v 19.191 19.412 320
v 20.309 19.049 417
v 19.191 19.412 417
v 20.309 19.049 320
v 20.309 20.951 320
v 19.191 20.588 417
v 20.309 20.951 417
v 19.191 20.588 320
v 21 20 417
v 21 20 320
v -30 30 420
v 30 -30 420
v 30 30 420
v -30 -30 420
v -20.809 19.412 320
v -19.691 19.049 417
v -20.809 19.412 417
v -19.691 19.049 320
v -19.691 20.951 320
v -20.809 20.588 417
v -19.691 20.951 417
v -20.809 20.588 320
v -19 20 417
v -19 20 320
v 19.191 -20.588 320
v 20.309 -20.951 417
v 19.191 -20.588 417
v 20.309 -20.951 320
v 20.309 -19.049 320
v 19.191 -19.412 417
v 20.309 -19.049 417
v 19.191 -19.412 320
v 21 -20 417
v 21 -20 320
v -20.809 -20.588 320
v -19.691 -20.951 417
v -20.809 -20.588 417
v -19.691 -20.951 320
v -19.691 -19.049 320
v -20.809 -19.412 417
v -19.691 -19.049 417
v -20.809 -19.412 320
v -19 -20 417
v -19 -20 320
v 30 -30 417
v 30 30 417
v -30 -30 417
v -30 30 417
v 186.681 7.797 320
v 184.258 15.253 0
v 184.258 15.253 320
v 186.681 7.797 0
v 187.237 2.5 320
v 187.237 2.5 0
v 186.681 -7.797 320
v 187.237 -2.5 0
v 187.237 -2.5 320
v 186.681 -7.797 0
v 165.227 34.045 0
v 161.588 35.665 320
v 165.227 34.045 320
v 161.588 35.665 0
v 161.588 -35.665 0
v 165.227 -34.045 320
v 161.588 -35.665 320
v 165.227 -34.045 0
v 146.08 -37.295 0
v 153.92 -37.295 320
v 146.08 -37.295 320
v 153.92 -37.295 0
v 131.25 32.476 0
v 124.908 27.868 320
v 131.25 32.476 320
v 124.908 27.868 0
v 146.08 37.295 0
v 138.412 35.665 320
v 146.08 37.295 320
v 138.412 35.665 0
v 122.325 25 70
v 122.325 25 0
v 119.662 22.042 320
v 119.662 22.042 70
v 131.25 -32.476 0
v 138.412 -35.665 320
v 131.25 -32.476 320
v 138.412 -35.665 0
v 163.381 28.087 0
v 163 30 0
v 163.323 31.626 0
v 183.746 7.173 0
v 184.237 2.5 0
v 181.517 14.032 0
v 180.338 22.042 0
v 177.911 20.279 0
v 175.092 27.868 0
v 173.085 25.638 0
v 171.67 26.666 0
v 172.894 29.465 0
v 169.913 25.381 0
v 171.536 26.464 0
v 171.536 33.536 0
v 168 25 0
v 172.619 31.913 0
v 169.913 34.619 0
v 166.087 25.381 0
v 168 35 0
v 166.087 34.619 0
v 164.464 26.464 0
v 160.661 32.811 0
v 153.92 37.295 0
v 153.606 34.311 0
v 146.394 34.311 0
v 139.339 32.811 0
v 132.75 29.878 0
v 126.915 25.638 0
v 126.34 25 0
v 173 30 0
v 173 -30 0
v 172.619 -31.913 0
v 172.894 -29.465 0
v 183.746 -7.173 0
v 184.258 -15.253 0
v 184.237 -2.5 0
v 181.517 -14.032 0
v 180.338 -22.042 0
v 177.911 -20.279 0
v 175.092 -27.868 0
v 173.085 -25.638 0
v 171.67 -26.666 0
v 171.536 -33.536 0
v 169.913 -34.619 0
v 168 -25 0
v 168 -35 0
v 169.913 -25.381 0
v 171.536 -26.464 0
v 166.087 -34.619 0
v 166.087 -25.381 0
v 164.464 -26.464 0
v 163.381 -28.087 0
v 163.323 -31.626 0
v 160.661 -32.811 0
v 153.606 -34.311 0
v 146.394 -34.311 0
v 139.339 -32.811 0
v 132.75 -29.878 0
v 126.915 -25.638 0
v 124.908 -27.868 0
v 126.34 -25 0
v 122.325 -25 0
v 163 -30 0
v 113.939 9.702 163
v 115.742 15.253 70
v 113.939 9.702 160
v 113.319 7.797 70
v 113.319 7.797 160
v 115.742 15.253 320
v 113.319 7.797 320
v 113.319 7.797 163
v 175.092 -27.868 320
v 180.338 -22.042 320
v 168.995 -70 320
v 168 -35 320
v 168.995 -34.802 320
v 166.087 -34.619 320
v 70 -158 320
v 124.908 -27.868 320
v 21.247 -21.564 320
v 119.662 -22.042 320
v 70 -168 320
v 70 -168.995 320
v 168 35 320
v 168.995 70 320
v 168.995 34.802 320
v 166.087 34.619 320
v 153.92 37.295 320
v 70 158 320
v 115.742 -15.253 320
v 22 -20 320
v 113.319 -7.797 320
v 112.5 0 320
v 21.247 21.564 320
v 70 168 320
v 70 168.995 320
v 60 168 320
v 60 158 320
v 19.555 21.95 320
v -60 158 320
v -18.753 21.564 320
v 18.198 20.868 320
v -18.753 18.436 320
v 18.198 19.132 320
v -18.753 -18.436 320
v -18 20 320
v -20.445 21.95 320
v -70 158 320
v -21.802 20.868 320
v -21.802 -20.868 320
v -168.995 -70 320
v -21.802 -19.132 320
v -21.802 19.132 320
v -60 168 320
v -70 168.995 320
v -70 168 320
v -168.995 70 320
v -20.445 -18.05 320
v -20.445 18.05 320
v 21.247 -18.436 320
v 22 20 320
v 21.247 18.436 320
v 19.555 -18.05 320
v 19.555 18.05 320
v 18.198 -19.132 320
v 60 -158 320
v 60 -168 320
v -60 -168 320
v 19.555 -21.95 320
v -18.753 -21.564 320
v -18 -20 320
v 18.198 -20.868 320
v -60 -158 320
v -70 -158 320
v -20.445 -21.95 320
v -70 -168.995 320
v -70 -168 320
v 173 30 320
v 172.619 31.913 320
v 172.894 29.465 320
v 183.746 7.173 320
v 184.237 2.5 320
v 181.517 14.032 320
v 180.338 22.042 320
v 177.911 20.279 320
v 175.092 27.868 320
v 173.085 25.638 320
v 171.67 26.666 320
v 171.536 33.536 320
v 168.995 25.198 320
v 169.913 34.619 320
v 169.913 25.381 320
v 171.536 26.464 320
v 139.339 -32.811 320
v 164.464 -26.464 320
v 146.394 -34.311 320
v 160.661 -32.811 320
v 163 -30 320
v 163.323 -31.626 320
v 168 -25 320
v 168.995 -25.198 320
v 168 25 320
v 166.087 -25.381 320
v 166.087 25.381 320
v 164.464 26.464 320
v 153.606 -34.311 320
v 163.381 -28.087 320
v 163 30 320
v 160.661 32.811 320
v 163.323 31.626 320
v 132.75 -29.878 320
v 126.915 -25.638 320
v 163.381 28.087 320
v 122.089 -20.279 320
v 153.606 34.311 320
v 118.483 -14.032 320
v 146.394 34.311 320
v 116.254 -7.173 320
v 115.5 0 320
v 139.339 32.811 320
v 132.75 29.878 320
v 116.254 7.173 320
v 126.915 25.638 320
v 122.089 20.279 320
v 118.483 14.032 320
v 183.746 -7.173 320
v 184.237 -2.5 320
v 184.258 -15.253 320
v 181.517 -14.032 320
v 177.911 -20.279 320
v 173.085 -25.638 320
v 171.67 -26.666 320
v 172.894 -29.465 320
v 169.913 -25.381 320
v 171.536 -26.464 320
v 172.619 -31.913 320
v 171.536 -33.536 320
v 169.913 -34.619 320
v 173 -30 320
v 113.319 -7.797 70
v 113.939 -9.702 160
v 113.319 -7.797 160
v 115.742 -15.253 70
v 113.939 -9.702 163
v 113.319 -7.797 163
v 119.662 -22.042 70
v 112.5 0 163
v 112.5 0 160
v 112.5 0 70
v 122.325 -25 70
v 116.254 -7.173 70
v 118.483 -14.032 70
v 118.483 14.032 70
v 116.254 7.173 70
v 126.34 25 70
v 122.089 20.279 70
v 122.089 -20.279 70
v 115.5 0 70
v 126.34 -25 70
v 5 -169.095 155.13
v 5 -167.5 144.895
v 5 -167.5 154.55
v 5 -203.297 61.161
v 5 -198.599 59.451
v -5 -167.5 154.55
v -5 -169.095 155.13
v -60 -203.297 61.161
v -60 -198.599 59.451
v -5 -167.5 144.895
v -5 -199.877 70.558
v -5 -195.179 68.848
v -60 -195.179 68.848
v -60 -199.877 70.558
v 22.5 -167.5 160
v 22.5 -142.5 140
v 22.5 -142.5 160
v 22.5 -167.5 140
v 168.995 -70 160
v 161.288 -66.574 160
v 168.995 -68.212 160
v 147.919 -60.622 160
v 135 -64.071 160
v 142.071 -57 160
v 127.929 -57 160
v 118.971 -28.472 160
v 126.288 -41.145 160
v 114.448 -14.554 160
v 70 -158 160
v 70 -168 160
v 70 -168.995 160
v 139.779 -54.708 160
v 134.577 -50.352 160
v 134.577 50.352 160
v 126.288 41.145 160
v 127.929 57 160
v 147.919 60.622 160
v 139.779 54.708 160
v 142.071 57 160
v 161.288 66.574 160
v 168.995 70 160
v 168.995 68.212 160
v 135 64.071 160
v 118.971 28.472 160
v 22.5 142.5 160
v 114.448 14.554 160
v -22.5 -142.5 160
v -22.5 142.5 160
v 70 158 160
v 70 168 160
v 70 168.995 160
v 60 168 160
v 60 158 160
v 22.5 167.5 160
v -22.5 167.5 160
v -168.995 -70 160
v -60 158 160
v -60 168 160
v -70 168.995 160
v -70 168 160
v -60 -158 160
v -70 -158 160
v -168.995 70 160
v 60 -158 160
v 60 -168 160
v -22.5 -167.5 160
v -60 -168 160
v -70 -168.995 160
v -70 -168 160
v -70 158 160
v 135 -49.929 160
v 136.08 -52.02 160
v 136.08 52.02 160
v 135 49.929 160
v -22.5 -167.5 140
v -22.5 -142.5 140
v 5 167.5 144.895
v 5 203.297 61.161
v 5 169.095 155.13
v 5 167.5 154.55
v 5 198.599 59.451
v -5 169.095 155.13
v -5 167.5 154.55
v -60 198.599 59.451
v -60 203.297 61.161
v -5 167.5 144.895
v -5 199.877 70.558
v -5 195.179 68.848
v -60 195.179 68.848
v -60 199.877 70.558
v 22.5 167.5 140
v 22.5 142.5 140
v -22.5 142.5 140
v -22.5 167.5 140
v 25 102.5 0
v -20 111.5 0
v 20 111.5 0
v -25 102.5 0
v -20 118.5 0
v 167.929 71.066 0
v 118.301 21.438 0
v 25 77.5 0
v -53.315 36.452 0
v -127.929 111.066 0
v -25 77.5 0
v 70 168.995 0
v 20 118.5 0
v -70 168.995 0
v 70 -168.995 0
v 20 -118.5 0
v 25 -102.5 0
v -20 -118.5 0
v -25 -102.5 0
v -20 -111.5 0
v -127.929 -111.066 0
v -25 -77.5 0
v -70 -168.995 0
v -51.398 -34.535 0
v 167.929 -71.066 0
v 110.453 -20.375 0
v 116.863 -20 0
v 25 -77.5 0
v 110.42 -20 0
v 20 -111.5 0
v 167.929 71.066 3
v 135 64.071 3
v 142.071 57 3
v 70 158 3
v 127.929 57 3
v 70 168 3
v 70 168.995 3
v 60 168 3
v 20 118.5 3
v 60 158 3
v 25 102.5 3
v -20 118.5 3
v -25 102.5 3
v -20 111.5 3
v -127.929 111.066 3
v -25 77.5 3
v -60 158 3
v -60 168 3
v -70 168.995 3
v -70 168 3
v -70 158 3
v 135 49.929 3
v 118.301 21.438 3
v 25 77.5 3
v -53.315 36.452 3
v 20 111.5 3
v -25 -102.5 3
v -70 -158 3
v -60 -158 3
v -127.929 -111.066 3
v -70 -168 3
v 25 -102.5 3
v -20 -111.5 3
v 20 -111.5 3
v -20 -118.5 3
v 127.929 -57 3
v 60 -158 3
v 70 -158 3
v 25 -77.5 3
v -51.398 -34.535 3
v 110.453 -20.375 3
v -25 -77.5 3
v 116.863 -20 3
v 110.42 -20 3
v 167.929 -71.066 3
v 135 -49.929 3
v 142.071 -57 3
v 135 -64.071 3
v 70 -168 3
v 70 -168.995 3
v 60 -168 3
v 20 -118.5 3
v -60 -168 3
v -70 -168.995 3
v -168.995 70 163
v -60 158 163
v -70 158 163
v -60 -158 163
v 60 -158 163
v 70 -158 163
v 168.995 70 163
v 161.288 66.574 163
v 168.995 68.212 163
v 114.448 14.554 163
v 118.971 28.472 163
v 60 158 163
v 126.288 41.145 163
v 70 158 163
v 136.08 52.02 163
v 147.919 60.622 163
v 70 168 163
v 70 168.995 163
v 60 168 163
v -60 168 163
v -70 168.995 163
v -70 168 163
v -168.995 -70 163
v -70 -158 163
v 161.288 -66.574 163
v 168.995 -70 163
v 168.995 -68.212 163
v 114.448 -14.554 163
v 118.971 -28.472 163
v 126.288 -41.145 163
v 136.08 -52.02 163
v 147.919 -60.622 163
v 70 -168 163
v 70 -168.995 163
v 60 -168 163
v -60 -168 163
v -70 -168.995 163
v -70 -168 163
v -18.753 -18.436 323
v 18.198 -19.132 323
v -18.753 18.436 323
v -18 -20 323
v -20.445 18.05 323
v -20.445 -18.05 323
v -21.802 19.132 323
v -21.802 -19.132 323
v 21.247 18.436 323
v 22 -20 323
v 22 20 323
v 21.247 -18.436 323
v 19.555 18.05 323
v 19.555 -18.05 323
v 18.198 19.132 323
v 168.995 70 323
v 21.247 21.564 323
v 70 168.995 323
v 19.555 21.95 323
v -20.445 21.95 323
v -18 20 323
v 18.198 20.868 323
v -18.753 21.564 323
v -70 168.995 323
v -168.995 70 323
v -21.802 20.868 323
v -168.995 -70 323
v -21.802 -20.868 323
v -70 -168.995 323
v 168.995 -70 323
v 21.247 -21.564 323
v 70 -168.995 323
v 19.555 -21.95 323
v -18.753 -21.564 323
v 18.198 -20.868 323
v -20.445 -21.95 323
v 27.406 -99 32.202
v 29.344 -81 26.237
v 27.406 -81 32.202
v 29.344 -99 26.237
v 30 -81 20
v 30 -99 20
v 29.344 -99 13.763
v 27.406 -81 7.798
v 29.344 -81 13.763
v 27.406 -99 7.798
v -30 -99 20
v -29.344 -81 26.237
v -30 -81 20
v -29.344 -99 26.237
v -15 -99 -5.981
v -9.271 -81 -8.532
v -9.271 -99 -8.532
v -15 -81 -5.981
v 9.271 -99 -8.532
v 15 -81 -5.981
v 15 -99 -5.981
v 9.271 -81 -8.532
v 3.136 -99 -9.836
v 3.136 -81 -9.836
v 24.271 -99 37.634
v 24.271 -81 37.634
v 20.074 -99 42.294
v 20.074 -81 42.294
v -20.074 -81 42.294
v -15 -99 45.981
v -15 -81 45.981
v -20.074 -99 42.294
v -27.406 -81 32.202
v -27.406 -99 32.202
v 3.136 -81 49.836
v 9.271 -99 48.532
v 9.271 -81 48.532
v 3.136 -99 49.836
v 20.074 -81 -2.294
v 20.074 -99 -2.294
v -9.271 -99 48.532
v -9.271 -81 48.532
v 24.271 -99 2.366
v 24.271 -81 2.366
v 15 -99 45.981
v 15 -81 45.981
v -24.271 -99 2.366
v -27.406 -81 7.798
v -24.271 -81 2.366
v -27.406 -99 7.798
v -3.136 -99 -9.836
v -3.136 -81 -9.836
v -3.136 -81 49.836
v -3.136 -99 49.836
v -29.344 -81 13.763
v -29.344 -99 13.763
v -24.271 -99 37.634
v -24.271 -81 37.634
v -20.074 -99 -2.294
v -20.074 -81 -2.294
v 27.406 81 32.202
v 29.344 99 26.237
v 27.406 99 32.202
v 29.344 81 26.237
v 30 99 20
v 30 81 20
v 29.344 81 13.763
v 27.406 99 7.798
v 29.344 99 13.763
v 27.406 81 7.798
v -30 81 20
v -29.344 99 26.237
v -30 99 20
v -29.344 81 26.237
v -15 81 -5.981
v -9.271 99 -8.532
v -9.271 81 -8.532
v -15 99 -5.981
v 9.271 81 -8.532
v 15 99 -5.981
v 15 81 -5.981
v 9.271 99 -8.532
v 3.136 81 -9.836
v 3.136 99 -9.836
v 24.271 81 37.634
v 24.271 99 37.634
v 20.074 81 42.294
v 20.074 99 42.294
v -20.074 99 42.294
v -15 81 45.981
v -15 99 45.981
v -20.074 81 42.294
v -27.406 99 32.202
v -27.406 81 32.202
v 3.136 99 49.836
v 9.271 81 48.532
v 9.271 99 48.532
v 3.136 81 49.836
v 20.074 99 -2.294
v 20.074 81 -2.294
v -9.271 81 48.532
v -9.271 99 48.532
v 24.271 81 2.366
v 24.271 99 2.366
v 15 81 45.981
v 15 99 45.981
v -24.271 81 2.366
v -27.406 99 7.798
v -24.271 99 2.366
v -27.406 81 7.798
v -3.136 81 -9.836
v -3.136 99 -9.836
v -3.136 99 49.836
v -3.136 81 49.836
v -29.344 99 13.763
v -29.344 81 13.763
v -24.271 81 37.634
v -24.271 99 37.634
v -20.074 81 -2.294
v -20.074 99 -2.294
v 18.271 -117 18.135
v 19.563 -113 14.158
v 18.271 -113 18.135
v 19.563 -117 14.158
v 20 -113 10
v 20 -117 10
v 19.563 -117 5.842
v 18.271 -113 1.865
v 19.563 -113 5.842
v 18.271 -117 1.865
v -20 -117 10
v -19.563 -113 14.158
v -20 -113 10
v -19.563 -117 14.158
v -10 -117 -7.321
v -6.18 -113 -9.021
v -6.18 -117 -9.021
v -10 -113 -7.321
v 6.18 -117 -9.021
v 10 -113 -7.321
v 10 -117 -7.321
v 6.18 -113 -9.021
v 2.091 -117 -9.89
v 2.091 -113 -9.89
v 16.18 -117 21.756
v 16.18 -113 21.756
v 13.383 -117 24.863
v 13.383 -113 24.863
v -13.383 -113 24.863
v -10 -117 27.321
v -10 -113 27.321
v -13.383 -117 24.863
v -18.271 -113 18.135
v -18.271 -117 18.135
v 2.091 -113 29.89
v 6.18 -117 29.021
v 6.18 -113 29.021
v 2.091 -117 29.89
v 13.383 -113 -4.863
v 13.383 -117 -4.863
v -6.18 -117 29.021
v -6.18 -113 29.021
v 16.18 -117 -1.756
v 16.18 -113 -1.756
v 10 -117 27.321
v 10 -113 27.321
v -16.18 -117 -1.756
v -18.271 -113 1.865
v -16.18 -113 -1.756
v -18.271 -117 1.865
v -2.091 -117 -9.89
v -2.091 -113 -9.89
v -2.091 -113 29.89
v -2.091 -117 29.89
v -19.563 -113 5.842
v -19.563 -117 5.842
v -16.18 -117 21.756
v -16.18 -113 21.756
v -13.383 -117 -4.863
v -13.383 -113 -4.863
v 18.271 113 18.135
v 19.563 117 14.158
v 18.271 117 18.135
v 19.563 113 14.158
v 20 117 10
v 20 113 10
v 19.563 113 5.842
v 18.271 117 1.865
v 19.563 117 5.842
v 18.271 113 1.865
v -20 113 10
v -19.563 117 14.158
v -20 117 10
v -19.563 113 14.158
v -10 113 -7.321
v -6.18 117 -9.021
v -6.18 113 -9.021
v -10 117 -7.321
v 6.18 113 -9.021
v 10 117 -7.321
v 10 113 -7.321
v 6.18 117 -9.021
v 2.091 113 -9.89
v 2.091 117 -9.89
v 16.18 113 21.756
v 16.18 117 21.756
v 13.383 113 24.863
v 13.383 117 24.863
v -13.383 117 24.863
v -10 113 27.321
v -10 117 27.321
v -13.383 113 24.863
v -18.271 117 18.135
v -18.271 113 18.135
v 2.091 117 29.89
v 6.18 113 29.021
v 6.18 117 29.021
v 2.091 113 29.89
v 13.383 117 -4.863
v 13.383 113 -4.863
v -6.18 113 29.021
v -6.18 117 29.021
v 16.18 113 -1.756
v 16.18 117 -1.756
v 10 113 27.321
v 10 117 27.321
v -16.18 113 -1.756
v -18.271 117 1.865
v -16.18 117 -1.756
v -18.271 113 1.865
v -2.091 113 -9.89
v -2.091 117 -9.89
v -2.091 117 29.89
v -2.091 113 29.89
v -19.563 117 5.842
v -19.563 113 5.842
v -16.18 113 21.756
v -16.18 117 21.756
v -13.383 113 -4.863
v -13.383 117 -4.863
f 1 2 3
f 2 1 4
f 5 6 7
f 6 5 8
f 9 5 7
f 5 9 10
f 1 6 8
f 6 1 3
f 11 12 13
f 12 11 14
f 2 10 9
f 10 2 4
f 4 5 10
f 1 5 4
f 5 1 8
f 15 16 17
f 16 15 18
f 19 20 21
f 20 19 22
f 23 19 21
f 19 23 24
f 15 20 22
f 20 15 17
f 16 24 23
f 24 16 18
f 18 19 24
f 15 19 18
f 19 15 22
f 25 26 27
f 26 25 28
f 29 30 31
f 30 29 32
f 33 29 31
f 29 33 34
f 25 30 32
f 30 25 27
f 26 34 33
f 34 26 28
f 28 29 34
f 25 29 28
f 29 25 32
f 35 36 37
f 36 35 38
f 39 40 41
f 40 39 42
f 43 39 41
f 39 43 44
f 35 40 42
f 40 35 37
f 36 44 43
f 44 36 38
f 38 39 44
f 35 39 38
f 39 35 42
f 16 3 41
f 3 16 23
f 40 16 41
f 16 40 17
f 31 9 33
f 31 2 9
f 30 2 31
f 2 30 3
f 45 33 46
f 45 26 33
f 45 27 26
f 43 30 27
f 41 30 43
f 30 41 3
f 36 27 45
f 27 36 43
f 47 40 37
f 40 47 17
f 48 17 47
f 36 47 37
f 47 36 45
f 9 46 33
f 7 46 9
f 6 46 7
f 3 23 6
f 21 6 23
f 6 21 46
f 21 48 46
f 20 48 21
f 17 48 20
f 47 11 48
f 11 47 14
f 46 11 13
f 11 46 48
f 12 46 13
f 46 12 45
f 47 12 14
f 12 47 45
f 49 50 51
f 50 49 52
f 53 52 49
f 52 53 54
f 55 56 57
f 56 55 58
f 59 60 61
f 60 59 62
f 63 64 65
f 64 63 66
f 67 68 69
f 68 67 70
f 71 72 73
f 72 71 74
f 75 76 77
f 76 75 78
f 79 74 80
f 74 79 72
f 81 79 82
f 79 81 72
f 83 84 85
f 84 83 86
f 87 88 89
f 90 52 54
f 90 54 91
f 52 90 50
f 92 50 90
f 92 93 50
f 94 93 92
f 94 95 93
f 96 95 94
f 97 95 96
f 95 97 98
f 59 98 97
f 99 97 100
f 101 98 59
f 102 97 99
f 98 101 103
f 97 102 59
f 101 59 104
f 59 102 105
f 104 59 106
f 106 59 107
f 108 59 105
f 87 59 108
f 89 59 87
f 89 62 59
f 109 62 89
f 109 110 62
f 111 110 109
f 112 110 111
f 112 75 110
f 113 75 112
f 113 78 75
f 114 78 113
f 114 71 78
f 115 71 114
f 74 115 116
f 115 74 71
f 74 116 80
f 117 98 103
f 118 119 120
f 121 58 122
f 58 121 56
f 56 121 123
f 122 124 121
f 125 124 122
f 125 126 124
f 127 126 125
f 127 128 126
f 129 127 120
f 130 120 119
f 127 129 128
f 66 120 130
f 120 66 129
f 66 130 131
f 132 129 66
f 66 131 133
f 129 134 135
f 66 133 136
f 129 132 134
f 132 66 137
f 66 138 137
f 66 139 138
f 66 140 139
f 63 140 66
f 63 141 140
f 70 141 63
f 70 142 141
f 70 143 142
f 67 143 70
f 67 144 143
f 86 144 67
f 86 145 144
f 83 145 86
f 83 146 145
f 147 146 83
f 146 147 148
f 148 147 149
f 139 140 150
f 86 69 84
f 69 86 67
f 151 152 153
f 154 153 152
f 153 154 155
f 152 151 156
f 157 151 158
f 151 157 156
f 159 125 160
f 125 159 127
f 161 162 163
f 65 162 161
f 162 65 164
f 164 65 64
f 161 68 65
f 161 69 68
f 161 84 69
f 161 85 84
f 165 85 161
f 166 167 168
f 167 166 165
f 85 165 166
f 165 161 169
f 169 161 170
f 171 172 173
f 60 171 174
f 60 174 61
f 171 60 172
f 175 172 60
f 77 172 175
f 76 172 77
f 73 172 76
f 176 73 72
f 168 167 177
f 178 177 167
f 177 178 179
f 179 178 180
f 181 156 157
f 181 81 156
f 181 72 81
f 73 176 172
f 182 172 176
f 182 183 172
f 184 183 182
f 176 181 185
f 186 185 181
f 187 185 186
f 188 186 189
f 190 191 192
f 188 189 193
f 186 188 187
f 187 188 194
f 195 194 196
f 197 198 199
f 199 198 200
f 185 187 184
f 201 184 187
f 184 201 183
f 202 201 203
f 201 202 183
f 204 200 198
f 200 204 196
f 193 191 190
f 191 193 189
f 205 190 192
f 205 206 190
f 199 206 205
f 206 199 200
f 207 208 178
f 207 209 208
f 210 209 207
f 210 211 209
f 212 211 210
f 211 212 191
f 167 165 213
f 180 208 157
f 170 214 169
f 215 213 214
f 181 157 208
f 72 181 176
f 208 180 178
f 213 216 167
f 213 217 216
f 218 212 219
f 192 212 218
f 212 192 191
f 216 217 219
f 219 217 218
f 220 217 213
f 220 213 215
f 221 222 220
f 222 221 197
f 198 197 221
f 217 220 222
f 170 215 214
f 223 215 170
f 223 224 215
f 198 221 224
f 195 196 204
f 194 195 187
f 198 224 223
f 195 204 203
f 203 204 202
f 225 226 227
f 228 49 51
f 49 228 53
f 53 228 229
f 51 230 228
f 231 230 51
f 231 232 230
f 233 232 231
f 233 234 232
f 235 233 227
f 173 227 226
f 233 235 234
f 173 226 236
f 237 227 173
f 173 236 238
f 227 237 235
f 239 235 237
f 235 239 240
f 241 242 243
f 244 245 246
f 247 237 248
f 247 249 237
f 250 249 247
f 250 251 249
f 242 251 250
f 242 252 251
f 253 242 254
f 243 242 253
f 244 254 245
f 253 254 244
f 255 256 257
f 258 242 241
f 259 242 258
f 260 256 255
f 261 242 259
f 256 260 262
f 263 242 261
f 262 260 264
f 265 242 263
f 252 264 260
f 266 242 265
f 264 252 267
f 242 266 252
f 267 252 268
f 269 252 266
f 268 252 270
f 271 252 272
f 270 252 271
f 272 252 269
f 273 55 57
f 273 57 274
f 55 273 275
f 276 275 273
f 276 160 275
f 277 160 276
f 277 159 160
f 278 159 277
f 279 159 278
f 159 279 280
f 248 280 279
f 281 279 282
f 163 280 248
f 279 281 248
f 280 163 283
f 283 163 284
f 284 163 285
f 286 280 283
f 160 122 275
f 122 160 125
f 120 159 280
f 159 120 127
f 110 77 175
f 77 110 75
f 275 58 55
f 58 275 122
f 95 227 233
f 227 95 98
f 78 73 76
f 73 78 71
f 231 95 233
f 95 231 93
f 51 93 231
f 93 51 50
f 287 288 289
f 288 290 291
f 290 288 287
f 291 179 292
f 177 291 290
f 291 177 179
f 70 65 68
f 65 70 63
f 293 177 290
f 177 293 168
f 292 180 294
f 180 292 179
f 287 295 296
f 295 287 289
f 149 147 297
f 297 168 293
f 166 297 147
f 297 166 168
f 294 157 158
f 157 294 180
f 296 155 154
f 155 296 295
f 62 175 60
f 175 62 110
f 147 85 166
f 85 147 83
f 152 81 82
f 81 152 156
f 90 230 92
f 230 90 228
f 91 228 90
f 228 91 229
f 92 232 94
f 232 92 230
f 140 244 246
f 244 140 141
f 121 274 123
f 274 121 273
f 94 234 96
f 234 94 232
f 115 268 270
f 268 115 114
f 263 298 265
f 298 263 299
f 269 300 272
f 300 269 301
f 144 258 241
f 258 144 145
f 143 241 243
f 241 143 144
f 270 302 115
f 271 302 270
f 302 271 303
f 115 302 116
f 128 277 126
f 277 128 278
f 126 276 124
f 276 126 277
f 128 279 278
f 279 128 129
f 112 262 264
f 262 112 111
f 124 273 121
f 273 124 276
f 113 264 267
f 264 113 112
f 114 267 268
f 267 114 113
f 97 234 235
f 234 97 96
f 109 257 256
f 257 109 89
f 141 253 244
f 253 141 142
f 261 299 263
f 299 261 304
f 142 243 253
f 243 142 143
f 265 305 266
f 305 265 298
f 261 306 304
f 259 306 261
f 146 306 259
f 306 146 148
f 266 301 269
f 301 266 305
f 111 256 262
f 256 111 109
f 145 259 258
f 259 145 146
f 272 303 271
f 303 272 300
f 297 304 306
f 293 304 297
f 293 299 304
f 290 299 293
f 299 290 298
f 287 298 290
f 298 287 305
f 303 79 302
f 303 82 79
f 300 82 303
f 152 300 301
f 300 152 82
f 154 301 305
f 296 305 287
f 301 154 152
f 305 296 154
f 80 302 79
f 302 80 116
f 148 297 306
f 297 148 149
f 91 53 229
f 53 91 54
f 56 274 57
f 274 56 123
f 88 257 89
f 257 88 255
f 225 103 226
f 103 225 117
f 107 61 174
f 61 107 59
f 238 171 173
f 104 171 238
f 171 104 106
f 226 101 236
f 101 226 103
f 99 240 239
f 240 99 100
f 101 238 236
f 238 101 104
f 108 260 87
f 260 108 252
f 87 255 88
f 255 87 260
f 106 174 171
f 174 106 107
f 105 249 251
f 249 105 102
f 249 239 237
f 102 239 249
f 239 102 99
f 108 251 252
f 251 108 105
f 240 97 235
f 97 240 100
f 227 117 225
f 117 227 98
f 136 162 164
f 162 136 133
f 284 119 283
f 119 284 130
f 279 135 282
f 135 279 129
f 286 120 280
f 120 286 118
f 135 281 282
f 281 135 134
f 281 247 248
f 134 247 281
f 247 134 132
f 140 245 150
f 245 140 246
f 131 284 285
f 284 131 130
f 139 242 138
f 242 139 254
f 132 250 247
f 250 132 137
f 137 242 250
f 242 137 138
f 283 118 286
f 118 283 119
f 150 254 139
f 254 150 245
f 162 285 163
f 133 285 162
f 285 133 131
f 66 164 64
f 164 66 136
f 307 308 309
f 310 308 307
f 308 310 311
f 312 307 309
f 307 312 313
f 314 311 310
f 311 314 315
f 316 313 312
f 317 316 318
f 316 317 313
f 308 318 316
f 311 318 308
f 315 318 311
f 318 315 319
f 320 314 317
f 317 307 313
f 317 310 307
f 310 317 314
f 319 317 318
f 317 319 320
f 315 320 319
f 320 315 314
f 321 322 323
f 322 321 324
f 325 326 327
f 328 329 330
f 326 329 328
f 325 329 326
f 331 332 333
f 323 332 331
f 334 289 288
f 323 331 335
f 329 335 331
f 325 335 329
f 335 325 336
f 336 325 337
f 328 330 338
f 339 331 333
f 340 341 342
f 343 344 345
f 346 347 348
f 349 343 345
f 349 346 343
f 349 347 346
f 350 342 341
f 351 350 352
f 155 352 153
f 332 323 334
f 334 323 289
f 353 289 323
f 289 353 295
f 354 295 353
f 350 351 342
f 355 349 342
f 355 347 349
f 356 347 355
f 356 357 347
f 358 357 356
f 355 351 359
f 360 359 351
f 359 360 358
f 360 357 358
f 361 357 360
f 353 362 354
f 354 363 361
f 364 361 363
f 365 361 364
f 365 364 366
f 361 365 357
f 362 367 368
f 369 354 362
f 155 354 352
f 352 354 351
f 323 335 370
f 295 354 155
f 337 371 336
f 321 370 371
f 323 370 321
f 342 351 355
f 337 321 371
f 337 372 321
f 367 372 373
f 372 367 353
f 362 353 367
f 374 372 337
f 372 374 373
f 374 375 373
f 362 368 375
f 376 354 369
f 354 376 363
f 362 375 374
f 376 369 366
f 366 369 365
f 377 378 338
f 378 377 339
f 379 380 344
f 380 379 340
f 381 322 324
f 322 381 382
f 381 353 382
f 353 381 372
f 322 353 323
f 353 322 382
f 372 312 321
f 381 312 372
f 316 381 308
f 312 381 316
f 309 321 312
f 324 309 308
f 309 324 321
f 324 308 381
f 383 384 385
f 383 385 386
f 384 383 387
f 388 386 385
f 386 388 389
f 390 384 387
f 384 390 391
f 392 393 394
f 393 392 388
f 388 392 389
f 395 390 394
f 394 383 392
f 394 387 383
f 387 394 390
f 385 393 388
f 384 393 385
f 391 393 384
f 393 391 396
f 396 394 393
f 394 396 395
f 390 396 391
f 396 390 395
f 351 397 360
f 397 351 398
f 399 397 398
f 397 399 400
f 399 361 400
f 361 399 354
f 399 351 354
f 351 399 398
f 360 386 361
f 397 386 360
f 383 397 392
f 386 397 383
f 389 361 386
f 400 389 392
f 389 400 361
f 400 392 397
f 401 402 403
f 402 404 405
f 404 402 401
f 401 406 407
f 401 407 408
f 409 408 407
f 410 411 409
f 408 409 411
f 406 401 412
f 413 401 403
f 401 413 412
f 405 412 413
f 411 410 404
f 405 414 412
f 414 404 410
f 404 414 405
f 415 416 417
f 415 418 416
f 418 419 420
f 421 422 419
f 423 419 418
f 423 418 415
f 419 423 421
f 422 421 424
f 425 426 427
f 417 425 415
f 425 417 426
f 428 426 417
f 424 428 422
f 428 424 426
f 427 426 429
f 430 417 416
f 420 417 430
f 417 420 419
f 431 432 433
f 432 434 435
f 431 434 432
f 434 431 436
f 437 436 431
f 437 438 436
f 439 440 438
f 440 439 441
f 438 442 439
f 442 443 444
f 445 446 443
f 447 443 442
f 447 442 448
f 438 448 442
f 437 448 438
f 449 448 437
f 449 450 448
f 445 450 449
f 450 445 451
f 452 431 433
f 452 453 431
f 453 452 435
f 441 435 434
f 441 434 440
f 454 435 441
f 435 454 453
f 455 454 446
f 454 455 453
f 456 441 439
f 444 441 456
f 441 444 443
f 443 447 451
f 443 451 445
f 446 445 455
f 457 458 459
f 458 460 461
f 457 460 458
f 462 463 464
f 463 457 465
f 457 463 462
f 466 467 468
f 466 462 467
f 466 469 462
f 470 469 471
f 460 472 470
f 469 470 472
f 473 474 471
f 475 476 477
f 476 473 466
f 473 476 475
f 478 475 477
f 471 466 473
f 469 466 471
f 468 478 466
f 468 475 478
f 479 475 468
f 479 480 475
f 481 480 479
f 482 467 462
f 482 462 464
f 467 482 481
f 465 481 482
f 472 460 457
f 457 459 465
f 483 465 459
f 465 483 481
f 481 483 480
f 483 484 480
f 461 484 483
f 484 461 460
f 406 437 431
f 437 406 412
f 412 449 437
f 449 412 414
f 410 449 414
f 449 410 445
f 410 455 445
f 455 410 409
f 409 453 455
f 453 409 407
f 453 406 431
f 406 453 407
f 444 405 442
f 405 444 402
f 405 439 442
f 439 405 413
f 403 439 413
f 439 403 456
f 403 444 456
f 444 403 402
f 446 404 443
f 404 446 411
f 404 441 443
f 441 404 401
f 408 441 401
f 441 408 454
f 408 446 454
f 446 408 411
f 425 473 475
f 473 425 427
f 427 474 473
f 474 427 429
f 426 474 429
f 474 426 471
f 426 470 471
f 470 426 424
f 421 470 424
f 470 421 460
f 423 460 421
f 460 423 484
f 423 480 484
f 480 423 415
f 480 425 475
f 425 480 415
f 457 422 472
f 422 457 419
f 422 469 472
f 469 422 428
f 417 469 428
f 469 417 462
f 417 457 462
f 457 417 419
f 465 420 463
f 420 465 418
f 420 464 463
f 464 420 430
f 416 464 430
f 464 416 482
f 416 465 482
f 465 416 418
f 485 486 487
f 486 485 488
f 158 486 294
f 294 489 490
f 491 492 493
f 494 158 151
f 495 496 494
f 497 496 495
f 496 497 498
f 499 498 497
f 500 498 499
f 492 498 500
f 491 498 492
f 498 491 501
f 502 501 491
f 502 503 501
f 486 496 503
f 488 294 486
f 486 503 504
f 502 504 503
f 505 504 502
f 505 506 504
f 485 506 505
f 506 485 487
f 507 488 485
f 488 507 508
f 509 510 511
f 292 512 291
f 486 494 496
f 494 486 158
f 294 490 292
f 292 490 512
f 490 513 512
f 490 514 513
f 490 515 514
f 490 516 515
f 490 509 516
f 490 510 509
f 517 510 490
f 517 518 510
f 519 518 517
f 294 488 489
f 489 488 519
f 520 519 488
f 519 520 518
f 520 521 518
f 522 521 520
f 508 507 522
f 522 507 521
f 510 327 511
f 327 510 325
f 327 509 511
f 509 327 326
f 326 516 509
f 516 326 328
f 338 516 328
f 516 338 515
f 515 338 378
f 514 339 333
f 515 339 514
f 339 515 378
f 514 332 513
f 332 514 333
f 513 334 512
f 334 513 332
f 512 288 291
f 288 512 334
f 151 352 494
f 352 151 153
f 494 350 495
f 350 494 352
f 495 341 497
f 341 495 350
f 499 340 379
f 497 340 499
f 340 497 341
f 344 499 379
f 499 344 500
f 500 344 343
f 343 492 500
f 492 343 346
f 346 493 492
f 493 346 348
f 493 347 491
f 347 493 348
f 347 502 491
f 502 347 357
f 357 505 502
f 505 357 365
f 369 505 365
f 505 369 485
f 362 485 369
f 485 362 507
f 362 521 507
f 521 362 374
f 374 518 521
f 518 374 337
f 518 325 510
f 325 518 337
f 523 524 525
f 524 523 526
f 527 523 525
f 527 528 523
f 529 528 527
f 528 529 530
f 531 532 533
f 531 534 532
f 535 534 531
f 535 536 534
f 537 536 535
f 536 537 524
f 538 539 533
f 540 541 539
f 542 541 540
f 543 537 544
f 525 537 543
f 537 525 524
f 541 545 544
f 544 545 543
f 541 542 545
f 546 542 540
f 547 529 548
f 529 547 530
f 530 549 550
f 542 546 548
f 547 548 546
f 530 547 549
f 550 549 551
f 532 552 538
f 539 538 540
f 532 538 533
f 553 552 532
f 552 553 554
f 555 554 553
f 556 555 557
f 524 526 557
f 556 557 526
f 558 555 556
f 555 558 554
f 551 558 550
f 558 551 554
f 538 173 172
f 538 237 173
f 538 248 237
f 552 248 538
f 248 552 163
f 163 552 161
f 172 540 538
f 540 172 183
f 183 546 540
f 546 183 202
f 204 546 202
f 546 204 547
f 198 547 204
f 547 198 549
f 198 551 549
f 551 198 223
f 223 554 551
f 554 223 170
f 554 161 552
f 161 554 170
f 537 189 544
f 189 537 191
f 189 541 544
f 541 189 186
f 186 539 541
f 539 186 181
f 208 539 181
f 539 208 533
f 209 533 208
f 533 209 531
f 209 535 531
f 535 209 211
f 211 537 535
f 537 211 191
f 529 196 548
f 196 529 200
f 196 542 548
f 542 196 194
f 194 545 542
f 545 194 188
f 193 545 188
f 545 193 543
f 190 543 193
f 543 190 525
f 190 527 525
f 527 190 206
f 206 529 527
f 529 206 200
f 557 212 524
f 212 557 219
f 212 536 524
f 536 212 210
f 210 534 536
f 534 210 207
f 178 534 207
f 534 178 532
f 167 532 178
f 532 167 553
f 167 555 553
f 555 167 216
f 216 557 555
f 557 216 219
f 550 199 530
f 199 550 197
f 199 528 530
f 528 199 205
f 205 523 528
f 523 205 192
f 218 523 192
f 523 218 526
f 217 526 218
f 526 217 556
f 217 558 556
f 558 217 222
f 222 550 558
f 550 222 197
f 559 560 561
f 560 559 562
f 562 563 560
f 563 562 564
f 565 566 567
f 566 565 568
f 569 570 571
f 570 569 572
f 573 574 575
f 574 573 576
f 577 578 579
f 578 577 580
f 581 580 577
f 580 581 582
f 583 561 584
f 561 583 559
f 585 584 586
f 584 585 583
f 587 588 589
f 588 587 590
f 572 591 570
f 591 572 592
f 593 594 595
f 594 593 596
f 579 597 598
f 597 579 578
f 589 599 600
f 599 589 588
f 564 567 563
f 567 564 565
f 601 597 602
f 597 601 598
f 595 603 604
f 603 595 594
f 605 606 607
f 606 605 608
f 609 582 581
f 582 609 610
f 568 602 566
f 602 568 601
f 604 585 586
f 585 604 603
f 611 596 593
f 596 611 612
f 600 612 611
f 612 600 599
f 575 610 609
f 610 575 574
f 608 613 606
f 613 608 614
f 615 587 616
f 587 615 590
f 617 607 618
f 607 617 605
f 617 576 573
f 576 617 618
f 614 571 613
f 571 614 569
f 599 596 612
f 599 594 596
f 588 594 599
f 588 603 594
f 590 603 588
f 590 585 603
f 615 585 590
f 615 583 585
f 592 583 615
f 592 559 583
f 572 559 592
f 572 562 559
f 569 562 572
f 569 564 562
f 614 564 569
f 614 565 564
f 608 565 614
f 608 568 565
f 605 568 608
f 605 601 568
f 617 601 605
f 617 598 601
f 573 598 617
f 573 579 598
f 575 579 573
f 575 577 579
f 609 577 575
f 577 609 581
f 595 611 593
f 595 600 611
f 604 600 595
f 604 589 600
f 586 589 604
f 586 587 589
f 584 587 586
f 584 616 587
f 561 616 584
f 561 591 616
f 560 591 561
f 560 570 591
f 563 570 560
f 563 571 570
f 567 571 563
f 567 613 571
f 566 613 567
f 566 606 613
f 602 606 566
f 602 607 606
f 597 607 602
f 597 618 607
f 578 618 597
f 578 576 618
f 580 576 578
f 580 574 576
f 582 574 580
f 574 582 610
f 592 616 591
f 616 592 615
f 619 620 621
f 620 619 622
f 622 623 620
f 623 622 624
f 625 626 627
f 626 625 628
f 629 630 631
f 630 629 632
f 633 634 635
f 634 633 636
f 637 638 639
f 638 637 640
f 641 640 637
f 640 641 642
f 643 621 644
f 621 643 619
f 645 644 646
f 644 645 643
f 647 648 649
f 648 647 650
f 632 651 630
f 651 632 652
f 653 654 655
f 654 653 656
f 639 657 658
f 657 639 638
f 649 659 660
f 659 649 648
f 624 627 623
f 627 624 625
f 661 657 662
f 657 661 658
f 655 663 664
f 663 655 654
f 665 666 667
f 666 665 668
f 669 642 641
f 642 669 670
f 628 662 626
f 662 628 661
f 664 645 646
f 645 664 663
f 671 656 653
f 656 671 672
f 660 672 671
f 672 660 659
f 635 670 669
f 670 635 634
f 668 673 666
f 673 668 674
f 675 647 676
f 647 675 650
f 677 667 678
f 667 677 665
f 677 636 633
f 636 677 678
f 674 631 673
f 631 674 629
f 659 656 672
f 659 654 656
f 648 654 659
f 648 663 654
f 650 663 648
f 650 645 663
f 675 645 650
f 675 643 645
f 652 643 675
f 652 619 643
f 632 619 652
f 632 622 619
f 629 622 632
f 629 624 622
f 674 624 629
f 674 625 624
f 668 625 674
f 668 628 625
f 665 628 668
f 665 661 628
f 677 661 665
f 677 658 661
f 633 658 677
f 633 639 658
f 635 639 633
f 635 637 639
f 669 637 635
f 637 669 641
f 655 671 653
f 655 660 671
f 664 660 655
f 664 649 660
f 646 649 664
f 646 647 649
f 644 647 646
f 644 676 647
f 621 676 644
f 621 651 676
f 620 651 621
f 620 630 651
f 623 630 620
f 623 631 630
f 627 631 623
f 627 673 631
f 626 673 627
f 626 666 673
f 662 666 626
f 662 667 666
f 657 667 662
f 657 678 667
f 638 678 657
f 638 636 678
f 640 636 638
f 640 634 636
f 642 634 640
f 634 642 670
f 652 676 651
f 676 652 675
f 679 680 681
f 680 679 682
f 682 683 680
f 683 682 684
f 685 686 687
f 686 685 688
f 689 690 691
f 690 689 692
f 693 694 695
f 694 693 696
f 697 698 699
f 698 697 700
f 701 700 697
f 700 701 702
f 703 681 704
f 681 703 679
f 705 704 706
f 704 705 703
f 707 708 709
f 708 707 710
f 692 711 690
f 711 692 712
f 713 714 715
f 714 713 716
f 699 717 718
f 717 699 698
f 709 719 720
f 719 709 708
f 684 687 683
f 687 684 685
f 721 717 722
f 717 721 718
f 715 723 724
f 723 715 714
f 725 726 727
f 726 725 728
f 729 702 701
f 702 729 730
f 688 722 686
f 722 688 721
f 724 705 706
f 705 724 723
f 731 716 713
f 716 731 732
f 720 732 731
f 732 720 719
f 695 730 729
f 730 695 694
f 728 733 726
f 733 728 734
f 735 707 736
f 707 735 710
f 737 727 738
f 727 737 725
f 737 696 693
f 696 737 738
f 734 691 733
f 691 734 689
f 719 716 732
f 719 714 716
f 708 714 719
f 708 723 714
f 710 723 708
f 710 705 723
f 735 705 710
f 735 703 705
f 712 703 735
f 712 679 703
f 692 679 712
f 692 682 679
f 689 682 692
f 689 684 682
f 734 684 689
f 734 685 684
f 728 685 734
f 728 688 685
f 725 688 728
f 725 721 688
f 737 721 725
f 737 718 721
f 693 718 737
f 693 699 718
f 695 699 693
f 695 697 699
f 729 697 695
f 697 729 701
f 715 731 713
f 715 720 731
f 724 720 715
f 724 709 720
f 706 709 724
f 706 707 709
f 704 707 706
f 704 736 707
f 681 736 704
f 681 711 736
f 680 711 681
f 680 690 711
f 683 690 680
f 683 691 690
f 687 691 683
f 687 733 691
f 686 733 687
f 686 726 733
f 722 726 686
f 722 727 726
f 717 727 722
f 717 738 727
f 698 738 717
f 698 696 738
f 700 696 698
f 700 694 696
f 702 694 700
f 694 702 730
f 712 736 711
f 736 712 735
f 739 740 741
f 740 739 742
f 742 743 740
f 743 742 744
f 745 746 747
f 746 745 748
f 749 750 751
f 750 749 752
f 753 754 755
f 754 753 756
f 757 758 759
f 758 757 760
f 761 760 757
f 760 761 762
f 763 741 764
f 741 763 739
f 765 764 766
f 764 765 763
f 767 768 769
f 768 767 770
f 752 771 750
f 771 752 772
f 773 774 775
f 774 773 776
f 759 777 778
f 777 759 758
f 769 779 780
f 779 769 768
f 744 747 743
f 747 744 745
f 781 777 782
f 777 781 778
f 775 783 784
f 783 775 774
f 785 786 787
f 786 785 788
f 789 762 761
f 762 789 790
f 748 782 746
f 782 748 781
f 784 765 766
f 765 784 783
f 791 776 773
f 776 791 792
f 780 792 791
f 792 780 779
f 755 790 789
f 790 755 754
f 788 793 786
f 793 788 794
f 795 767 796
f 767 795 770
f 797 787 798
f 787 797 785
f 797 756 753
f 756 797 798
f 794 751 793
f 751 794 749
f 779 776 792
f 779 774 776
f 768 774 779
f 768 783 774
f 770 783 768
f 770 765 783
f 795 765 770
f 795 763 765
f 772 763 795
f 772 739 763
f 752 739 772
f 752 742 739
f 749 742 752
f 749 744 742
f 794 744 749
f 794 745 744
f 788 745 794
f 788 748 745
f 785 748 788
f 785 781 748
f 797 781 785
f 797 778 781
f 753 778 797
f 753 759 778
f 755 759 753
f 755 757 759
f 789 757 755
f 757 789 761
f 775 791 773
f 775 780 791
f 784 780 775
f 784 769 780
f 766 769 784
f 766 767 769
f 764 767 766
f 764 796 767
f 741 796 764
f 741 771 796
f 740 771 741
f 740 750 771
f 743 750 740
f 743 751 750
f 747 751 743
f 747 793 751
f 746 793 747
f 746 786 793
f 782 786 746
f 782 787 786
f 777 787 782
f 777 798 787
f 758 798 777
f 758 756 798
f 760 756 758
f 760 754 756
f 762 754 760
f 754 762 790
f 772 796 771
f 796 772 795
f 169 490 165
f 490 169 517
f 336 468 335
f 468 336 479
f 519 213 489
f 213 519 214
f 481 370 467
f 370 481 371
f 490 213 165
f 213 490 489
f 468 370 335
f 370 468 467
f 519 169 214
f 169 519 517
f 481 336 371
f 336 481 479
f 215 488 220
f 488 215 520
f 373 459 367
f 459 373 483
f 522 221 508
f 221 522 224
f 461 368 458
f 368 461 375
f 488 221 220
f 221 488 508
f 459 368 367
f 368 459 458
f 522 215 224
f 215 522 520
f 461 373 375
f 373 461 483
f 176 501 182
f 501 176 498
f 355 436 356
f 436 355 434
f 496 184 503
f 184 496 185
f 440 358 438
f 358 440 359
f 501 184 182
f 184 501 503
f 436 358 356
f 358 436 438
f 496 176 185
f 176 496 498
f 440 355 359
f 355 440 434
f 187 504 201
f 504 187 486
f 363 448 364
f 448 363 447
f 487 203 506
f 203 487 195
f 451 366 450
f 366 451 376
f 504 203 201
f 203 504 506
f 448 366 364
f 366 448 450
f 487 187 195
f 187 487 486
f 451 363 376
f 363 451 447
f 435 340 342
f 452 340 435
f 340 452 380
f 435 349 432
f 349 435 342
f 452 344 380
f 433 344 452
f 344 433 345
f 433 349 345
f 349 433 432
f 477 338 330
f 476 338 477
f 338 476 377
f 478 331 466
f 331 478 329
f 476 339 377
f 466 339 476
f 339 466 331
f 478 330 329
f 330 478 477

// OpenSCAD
perimetre=1200;
long_cote=140;
epaisseur=3;
hauteur_robot=320;
//base bas
rayon_evidee=70;
entraxe_roues=180;
entraxe_roues_cod=230;
larg_roues=25;
long_roues=50;
larg_roues_cod=7;
long_roues_cod=40;
//base interm
hauteur_interm=160;
//base haut
cote_trou=40;
dia_trou=2;
//tourelle
dia_barre=2;
cote_tour=60;
hauteur_max=420;
epaisseur_plaque=3;


module base_hexagonale(cote)
{
	nbr_cote=8;
	rayon=cote/2/sin(360/2/nbr_cote);
	rotate([0,0,-7.5]) circle(r=rayon,$fn=nbr_cote);
}

module base_evidee(cote,rayon_evidee)
{
	difference()
	{
		rotate(30) base_hexagonale(cote);
		translate([(cote/2/sin(360/2/8)),0,0]) circle(rayon_evidee);
		//translate([-cote,0,0]) circle(rayon_evidee);
	}
}

module base_bas(cote,rayon_evidee)
{
	difference()
	{
		rotate(30) base_hexagonale(cote,rayon_evidee);
		translate([0,entraxe_roues/2,0]) square([long_roues,larg_roues],center=true);
		translate([0,-entraxe_roues/2,0]) square([long_roues,larg_roues],center=true);
		translate([0,entraxe_roues_cod/2,0]) square([long_roues_cod,larg_roues_cod],center=true);
		translate([0,-entraxe_roues_cod/2,0]) square([long_roues_cod,larg_roues_cod],center=true);
		//passage pieds
		translate([-130,0,0]) rotate([0,0,45]) square([160,160],center=true);
		translate([0,-20,0]) rotate([0,0,5]) square([220,20],center=true);
		translate([20,20,0]) rotate([0,0,-5]) square([220,20],center=true);
		translate([20,00,0]) rotate([0,0,0]) square([220,40],center=true);
		translate([210,0,0]) rotate([0,0,45]) square([160,160],center=true);
	}
}

module base_interm(cote,rayon_evidee)
{
	difference()
	{
		base_evidee(cote,rayon_evidee);
	}
}

module base_haut(cote,dia_trou,cote_trou)
{
	difference()
	{
		rotate(30) base_hexagonale(cote);
		translate([cote_trou/2,cote_trou/2,0]) circle(dia_trou);
		translate([-cote_trou/2,cote_trou/2,0]) circle(dia_trou);
		translate([cote_trou/2,-cote_trou/2,0]) circle(dia_trou);
		translate([-cote_trou/2,-cote_trou/2,0]) circle(dia_trou);
	}
}

module tourelle(dia_barre,cote_trou,cote_tour,hauteur,epaisseur_plaque)
{
		translate([cote_trou/2,cote_trou/2,0])
			cylinder(d1=dia_barre,d2=dia_barre,h=hauteur);
		translate([-cote_trou/2,cote_trou/2,0])
			cylinder(d1=dia_barre,d2=dia_barre,h=hauteur);
		translate([cote_trou/2,-cote_trou/2,0])
			cylinder(d1=dia_barre,d2=dia_barre,h=hauteur);
		translate([-cote_trou/2,-cote_trou/2,0])
			cylinder(d1=dia_barre,d2=dia_barre,h=hauteur);
		translate([0,0,hauteur-epaisseur_plaque])
			linear_extrude(epaisseur_plaque)
				square(cote_tour,center=true);
}

module empileur()
{
	difference()
	{
		translate([0,0,(hauteur_robot)/2]) cylinder(h = hauteur_robot, r=75/2, center=true);
		translate([0,0,(hauteur_robot)/2]) cylinder(h = hauteur_robot, r=75/2-3, center=true);
		translate([-30,0,70/2])cube([50,50,70],center=true);
		translate([20,0,(hauteur_robot)/2])cube([80,5,hauteur_robot],center=true);
	}
		translate([18,30,(hauteur_robot)/2]) cylinder(h = hauteur_robot, r=5, center=true);
		translate([18,-30,(hauteur_robot)/2]) cylinder(h = hauteur_robot, r=5, center=true);
}

module bras()
{
	cube([45,25,20],center=true);
	rotate([-20,0,0])
		bras_part();
}

module bras_part()
{
	translate([0,-25/2,-50]) cube([10,5,100],center=true);
	translate([-30,-25/2,-95]) cube([60,5,10],center=true);
}

cote=perimetre/8;
//bas
linear_extrude(epaisseur) base_bas(long_cote,rayon_evidee);

//interm
translate([0,0,hauteur_interm])
	linear_extrude(epaisseur)
		base_interm(long_cote,rayon_evidee);

//haut
translate([0,0,hauteur_robot])
	linear_extrude(epaisseur)
		base_haut(long_cote,dia_trou,cote_trou);
translate([0,0,hauteur_robot])

//tourelle
	tourelle(dia_barre,cote_trou,cote_tour,hauteur_max-hauteur_robot,epaisseur_plaque);

//roues motrices
long_roues=50;
larg_roues_cod=7;
translate([0,-entraxe_roues/2,20])rotate([90,0,0]) cylinder(h = larg_roues-7, r=30, center=true);
translate([0,entraxe_roues/2,20])rotate([90,0,0]) cylinder(h = larg_roues-7, r=30, center=true);

//roues codeuses
translate([0,-entraxe_roues_cod/2,10])rotate([90,0,0]) cylinder(h = larg_roues_cod-3, r=20, center=true);
translate([0,entraxe_roues_cod/2,10])rotate([90,0,0]) cylinder(h = larg_roues_cod-3, r=20, center=true);

//barres
//grandes
translate([65,-163,hauteur_robot/2])cube([10,10,hauteur_robot],center=true);
translate([-65,-163,hauteur_robot/2])cube([10,10,hauteur_robot],center=true);
translate([65,163,hauteur_robot/2])cube([10,10,hauteur_robot],center=true);
translate([-65,163,hauteur_robot/2])cube([10,10,hauteur_robot],center=true);
//petites
translate([135,57,hauteur_interm/2])rotate([0,0,45])cube([10,10,hauteur_interm],center=true);
translate([135,-57,hauteur_interm/2])rotate([0,0,45])cube([10,10,hauteur_interm],center=true);

//empileur
translate([150,0,0]) empileur();

//bras
translate([0,-155,hauteur_interm-10]) bras();
mirror([0,1,0]) translate([0,-155,hauteur_interm-10]) bras();
